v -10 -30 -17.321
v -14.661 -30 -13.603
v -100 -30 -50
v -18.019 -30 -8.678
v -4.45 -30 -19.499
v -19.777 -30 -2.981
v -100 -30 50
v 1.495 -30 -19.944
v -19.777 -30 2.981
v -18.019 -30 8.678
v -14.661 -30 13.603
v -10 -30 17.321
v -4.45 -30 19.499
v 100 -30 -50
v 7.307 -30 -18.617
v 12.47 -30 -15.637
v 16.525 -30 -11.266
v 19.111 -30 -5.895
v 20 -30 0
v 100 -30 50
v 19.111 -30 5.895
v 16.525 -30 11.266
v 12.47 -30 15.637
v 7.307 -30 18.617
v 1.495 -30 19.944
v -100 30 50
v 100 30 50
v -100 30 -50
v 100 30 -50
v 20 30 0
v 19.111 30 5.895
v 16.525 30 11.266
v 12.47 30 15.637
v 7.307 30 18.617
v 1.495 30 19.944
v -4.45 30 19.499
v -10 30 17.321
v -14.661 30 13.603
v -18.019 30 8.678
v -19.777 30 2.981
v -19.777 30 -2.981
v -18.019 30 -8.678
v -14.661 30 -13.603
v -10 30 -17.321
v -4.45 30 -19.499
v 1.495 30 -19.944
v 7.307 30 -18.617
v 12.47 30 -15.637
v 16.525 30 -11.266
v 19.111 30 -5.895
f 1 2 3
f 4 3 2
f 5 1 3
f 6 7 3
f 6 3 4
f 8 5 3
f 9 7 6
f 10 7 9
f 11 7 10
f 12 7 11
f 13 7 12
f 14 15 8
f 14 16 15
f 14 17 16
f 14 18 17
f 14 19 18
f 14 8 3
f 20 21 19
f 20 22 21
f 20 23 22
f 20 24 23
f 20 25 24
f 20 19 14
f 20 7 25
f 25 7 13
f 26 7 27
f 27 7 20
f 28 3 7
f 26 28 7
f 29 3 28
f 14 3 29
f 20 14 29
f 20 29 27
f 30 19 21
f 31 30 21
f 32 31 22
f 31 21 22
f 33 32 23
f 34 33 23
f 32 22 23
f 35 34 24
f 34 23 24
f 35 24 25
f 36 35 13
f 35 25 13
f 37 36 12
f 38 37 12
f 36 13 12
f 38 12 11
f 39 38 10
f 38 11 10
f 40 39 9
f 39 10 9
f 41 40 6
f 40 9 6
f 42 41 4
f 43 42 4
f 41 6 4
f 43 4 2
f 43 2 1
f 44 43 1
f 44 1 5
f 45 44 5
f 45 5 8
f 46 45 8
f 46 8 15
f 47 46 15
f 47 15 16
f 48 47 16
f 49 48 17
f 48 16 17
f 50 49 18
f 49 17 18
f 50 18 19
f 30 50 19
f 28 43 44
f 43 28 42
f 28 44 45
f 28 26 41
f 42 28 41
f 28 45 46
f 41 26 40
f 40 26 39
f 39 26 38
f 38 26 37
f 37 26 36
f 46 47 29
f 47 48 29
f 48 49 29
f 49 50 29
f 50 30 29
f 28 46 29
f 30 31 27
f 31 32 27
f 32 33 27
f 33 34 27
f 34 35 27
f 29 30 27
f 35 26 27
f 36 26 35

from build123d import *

# Parameters (mm, degrees)
F0_W     = 200
F0_H     = 100
F1_DEPTH = 30
F2_R     = 20
F3_DEPTH = 60


with BuildPart() as f1:
    # F0 (on Front) → F1 (new body, symmetric)
    with BuildSketch(Plane.XZ):
        Rectangle(F0_W, F0_H)
    extrude(amount=F1_DEPTH, both=True)

    # F2 (on face) → F3 (cut, symmetric)
    with BuildSketch(Plane.XZ.offset(30)):
        Circle(F2_R)
    extrude(amount=F3_DEPTH, both=True, mode=Mode.SUBTRACT)


solid = f1.part
